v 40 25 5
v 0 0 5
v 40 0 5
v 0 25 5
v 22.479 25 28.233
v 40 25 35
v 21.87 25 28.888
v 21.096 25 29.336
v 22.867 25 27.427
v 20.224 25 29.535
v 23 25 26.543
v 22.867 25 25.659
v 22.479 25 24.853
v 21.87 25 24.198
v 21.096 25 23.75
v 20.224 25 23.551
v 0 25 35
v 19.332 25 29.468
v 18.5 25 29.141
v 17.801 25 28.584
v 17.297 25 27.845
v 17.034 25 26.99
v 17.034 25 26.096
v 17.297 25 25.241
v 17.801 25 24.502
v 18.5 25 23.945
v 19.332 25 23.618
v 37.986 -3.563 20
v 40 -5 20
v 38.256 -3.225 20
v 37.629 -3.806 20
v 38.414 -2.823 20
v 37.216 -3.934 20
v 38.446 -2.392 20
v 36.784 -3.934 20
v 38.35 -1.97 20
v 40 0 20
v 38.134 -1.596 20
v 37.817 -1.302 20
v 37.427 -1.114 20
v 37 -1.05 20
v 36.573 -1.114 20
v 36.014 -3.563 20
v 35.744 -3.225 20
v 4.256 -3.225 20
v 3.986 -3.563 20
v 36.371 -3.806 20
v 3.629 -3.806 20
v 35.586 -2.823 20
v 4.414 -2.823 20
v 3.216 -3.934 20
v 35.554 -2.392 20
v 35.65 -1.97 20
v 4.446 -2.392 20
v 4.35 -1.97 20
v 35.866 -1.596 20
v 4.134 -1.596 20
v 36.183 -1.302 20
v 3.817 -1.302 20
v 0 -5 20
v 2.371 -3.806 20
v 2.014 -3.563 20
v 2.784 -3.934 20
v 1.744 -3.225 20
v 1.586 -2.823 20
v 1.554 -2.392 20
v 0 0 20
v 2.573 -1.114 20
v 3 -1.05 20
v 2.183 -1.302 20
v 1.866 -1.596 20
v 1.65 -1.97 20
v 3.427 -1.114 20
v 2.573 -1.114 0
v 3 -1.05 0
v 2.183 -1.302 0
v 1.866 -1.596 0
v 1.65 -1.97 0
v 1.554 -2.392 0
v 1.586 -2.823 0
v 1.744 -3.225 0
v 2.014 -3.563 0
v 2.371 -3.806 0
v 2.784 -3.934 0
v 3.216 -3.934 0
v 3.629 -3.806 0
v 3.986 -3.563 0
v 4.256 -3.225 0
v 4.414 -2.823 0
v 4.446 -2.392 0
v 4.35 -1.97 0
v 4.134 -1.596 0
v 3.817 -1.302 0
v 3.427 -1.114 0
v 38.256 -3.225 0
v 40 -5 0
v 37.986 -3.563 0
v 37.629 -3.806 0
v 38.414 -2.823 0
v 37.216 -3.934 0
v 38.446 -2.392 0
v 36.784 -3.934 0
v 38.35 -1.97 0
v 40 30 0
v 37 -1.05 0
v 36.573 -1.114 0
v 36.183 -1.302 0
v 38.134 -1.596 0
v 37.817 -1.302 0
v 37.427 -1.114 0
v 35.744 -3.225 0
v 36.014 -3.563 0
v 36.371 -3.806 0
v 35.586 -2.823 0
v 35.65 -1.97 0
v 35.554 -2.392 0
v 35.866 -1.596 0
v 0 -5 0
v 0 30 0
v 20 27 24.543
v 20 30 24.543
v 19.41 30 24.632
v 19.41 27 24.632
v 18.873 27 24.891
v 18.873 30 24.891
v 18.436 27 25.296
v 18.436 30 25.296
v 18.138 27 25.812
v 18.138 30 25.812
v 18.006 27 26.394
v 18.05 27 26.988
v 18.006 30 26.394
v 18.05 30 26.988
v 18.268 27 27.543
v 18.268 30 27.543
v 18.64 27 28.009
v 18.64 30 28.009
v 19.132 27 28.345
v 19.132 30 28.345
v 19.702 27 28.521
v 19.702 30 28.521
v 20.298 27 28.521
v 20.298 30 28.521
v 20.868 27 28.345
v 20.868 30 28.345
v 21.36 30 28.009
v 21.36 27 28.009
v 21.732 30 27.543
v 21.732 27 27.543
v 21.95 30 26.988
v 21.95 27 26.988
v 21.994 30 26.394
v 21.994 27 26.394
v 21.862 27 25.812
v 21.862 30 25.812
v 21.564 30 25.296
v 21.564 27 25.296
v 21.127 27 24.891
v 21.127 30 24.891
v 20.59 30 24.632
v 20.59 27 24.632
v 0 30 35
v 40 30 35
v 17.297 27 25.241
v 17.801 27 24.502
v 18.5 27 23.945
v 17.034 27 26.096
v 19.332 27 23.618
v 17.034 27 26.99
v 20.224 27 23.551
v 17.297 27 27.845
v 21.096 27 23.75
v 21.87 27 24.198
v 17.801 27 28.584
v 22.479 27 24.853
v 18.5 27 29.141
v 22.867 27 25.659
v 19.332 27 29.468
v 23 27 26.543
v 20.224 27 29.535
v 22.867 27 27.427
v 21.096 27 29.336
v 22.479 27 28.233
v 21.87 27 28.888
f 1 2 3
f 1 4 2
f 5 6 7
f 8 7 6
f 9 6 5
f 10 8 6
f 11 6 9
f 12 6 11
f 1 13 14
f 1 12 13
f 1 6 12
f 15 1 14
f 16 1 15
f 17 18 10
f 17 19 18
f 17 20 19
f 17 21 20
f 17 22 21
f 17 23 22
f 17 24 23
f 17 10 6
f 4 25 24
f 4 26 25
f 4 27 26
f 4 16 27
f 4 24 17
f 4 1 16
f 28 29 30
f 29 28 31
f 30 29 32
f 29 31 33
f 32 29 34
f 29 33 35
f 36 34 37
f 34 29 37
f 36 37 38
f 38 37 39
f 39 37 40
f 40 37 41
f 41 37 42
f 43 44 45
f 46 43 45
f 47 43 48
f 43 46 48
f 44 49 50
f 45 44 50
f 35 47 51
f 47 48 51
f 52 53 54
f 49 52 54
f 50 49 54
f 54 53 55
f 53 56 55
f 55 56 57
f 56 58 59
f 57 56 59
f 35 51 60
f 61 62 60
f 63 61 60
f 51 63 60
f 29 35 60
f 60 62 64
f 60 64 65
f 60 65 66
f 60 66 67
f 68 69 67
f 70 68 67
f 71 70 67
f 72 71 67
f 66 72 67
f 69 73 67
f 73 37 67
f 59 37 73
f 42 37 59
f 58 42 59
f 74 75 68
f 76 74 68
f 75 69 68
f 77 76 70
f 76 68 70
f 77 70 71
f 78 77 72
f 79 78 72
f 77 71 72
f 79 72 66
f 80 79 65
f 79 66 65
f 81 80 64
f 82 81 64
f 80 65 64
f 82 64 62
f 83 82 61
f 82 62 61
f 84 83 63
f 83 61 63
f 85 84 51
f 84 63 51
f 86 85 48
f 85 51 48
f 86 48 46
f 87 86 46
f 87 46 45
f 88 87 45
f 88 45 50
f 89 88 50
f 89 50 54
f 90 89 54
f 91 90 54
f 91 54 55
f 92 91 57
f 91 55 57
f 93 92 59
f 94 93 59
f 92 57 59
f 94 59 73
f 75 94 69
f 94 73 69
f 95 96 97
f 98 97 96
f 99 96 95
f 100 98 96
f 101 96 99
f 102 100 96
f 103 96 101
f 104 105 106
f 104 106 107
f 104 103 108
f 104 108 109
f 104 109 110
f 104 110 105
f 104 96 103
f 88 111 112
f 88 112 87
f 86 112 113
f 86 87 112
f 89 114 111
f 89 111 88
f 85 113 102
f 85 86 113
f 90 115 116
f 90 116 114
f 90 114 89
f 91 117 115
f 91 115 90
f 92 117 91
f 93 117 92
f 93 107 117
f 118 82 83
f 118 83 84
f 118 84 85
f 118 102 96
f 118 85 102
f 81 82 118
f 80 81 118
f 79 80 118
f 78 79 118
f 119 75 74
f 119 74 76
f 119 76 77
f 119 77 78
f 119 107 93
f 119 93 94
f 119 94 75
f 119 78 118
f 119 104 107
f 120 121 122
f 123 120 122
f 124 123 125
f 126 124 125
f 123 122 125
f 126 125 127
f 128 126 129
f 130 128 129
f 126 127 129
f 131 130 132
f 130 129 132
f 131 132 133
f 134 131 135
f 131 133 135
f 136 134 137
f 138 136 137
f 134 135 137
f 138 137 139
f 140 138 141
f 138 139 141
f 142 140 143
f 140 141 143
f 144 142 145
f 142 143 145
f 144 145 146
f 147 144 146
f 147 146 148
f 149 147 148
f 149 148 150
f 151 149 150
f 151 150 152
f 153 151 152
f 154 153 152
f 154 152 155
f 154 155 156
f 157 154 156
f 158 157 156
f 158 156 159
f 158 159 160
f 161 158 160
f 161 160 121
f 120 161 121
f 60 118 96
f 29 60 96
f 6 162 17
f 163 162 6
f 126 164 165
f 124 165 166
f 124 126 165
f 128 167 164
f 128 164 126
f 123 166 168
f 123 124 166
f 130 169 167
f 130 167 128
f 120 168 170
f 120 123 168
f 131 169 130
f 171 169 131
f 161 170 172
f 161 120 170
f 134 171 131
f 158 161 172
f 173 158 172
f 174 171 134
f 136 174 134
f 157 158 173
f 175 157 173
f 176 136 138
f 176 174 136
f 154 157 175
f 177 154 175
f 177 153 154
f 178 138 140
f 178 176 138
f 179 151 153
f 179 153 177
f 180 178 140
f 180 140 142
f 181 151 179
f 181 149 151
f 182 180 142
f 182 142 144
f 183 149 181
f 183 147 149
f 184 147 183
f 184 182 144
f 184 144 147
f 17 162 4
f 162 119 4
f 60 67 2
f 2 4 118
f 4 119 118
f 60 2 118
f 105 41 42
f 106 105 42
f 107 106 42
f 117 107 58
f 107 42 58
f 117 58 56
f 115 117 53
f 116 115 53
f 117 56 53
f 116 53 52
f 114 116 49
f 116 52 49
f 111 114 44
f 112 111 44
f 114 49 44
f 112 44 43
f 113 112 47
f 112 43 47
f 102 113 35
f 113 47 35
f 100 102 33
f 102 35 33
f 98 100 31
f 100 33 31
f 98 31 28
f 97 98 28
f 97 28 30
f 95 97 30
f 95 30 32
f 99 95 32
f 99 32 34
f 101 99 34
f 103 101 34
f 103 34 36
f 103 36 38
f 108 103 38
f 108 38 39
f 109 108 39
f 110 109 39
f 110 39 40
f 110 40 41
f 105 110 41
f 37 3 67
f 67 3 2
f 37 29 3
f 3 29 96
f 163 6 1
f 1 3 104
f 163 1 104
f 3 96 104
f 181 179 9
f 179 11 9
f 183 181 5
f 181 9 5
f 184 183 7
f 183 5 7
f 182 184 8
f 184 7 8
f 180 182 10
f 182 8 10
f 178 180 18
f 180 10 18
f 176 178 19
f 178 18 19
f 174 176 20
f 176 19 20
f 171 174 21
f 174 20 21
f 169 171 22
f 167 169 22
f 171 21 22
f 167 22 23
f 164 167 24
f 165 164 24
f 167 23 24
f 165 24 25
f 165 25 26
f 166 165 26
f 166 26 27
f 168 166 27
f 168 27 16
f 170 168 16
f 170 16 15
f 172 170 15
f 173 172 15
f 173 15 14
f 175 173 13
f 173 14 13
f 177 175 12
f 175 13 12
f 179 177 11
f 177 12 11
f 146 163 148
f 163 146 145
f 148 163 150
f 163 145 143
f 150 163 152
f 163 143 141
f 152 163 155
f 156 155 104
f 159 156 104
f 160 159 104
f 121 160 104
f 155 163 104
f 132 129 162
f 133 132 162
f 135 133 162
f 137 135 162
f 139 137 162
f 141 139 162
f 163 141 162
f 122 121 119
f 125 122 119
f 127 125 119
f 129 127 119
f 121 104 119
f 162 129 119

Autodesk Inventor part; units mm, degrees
ref_plane "YZ Plane" through (0, 0, 0) normal (1, 0, 0) x (0, 1, 0)
ref_plane "XZ Plane" through (0, 0, 0) normal (0, 1, 0) x (-1, 0, 0)
ref_plane "XY Plane" through (0, 0, 0) normal (0, 0, 1) x (1, 0, 0)
sketch "Szkic1" plane through (0, 0, 0) normal (0, 0, 1) x (1, 0, 0)
  line L0 (0, 0) -> (40, 0)
  line L1 (40, 0) -> (40, 30)
  line L2 (40, 30) -> (0, 30)
  line L3 (0, 30) -> (0, 0)
  dimension "d0" = 40
  dimension "d1" = 30
extrude "Wyciągnięcie proste1" add sketch "Szkic1" along normal blind 5
sketch "Szkic2" plane through (0, 0, 5) normal (0, 0, 1) x (1, 0, 0)
  line L0 (40, 30) -> (0, 30) projected
  line L1 (0, 30) -> (40, 30)
  line L2 (40, 30) -> (40, 25)
  line L3 (40, 25) -> (0, 25)
  line L4 (0, 30) -> (0, 0) projected
  dimension "d4" = 5
extrude "Wyciągnięcie proste2" add sketch "Szkic2" along normal blind 30
sketch "Szkic5" plane through (0, 0, 0) normal (0, 0, -1) x (-1, 0, 0)
  line L0 (-40, 0) -> (-40, 25) projected
  line L1 (-40, 0) -> (0, 0)
  line L2 (0, 0) -> (0, -5)
  line L3 (0, -5) -> (-40, -5)
  line L4 (-40, -5) -> (-40, 0)
  dimension "d7" = 5
extrude "Wyciągnięcie proste3" add sketch "Szkic5" against normal blind 20
sketch "Szkic6" plane through (0, 25, 5) normal (0, -1, 0) x (1, 0, 0)
  point P0 (0, -5)
  point P1 (20, 21.543)
hole "Otwór1" at (20, 25, 26.543) direction (0, 1, 0) diameter 4 end through all clearance for "Śruba ze łbem płaskim obrobiona" size "M4" standard "ANSI Profil metryczny M"
sketch "Szkic7" plane through (0, 25, 5) normal (0, -1, 0) x (1, 0, 0)
  circle A0 centre (20, 21.543) radius 2 projected
  circle A1 centre (20, 21.543) radius 3
  point P0 (0, -5)
  dimension "d17" = 6
extrude "Wyciągnięcie proste4" cut sketch "Szkic7" against normal blind 2 contours A0 | A1
sketch "Szkic8" plane through (0, 0, 0) normal (0, 0, -1) x (-1, 0, 0)
  line L0 (-40, -5) -> (-40, 30) projected
  line L1 (0, 30) -> (0, -5) projected
  point P0 (0, 0)
  point P1 (-37, -2.5)
  point P2 (-3, -2.5)
  dimension "d20" = 3
  dimension "d21" = 3
hole "Otwór2" at (37, -2.5, 0) at (3, -2.5, 0) direction (0, 0, 1) diameter 2.9 end through all clearance for "Śruba ze łbem płaskim obrobiona" size "M2.5" standard "ANSI Profil metryczny M"
equation "\"d21\" = d20"
properties part number "zacisk"
